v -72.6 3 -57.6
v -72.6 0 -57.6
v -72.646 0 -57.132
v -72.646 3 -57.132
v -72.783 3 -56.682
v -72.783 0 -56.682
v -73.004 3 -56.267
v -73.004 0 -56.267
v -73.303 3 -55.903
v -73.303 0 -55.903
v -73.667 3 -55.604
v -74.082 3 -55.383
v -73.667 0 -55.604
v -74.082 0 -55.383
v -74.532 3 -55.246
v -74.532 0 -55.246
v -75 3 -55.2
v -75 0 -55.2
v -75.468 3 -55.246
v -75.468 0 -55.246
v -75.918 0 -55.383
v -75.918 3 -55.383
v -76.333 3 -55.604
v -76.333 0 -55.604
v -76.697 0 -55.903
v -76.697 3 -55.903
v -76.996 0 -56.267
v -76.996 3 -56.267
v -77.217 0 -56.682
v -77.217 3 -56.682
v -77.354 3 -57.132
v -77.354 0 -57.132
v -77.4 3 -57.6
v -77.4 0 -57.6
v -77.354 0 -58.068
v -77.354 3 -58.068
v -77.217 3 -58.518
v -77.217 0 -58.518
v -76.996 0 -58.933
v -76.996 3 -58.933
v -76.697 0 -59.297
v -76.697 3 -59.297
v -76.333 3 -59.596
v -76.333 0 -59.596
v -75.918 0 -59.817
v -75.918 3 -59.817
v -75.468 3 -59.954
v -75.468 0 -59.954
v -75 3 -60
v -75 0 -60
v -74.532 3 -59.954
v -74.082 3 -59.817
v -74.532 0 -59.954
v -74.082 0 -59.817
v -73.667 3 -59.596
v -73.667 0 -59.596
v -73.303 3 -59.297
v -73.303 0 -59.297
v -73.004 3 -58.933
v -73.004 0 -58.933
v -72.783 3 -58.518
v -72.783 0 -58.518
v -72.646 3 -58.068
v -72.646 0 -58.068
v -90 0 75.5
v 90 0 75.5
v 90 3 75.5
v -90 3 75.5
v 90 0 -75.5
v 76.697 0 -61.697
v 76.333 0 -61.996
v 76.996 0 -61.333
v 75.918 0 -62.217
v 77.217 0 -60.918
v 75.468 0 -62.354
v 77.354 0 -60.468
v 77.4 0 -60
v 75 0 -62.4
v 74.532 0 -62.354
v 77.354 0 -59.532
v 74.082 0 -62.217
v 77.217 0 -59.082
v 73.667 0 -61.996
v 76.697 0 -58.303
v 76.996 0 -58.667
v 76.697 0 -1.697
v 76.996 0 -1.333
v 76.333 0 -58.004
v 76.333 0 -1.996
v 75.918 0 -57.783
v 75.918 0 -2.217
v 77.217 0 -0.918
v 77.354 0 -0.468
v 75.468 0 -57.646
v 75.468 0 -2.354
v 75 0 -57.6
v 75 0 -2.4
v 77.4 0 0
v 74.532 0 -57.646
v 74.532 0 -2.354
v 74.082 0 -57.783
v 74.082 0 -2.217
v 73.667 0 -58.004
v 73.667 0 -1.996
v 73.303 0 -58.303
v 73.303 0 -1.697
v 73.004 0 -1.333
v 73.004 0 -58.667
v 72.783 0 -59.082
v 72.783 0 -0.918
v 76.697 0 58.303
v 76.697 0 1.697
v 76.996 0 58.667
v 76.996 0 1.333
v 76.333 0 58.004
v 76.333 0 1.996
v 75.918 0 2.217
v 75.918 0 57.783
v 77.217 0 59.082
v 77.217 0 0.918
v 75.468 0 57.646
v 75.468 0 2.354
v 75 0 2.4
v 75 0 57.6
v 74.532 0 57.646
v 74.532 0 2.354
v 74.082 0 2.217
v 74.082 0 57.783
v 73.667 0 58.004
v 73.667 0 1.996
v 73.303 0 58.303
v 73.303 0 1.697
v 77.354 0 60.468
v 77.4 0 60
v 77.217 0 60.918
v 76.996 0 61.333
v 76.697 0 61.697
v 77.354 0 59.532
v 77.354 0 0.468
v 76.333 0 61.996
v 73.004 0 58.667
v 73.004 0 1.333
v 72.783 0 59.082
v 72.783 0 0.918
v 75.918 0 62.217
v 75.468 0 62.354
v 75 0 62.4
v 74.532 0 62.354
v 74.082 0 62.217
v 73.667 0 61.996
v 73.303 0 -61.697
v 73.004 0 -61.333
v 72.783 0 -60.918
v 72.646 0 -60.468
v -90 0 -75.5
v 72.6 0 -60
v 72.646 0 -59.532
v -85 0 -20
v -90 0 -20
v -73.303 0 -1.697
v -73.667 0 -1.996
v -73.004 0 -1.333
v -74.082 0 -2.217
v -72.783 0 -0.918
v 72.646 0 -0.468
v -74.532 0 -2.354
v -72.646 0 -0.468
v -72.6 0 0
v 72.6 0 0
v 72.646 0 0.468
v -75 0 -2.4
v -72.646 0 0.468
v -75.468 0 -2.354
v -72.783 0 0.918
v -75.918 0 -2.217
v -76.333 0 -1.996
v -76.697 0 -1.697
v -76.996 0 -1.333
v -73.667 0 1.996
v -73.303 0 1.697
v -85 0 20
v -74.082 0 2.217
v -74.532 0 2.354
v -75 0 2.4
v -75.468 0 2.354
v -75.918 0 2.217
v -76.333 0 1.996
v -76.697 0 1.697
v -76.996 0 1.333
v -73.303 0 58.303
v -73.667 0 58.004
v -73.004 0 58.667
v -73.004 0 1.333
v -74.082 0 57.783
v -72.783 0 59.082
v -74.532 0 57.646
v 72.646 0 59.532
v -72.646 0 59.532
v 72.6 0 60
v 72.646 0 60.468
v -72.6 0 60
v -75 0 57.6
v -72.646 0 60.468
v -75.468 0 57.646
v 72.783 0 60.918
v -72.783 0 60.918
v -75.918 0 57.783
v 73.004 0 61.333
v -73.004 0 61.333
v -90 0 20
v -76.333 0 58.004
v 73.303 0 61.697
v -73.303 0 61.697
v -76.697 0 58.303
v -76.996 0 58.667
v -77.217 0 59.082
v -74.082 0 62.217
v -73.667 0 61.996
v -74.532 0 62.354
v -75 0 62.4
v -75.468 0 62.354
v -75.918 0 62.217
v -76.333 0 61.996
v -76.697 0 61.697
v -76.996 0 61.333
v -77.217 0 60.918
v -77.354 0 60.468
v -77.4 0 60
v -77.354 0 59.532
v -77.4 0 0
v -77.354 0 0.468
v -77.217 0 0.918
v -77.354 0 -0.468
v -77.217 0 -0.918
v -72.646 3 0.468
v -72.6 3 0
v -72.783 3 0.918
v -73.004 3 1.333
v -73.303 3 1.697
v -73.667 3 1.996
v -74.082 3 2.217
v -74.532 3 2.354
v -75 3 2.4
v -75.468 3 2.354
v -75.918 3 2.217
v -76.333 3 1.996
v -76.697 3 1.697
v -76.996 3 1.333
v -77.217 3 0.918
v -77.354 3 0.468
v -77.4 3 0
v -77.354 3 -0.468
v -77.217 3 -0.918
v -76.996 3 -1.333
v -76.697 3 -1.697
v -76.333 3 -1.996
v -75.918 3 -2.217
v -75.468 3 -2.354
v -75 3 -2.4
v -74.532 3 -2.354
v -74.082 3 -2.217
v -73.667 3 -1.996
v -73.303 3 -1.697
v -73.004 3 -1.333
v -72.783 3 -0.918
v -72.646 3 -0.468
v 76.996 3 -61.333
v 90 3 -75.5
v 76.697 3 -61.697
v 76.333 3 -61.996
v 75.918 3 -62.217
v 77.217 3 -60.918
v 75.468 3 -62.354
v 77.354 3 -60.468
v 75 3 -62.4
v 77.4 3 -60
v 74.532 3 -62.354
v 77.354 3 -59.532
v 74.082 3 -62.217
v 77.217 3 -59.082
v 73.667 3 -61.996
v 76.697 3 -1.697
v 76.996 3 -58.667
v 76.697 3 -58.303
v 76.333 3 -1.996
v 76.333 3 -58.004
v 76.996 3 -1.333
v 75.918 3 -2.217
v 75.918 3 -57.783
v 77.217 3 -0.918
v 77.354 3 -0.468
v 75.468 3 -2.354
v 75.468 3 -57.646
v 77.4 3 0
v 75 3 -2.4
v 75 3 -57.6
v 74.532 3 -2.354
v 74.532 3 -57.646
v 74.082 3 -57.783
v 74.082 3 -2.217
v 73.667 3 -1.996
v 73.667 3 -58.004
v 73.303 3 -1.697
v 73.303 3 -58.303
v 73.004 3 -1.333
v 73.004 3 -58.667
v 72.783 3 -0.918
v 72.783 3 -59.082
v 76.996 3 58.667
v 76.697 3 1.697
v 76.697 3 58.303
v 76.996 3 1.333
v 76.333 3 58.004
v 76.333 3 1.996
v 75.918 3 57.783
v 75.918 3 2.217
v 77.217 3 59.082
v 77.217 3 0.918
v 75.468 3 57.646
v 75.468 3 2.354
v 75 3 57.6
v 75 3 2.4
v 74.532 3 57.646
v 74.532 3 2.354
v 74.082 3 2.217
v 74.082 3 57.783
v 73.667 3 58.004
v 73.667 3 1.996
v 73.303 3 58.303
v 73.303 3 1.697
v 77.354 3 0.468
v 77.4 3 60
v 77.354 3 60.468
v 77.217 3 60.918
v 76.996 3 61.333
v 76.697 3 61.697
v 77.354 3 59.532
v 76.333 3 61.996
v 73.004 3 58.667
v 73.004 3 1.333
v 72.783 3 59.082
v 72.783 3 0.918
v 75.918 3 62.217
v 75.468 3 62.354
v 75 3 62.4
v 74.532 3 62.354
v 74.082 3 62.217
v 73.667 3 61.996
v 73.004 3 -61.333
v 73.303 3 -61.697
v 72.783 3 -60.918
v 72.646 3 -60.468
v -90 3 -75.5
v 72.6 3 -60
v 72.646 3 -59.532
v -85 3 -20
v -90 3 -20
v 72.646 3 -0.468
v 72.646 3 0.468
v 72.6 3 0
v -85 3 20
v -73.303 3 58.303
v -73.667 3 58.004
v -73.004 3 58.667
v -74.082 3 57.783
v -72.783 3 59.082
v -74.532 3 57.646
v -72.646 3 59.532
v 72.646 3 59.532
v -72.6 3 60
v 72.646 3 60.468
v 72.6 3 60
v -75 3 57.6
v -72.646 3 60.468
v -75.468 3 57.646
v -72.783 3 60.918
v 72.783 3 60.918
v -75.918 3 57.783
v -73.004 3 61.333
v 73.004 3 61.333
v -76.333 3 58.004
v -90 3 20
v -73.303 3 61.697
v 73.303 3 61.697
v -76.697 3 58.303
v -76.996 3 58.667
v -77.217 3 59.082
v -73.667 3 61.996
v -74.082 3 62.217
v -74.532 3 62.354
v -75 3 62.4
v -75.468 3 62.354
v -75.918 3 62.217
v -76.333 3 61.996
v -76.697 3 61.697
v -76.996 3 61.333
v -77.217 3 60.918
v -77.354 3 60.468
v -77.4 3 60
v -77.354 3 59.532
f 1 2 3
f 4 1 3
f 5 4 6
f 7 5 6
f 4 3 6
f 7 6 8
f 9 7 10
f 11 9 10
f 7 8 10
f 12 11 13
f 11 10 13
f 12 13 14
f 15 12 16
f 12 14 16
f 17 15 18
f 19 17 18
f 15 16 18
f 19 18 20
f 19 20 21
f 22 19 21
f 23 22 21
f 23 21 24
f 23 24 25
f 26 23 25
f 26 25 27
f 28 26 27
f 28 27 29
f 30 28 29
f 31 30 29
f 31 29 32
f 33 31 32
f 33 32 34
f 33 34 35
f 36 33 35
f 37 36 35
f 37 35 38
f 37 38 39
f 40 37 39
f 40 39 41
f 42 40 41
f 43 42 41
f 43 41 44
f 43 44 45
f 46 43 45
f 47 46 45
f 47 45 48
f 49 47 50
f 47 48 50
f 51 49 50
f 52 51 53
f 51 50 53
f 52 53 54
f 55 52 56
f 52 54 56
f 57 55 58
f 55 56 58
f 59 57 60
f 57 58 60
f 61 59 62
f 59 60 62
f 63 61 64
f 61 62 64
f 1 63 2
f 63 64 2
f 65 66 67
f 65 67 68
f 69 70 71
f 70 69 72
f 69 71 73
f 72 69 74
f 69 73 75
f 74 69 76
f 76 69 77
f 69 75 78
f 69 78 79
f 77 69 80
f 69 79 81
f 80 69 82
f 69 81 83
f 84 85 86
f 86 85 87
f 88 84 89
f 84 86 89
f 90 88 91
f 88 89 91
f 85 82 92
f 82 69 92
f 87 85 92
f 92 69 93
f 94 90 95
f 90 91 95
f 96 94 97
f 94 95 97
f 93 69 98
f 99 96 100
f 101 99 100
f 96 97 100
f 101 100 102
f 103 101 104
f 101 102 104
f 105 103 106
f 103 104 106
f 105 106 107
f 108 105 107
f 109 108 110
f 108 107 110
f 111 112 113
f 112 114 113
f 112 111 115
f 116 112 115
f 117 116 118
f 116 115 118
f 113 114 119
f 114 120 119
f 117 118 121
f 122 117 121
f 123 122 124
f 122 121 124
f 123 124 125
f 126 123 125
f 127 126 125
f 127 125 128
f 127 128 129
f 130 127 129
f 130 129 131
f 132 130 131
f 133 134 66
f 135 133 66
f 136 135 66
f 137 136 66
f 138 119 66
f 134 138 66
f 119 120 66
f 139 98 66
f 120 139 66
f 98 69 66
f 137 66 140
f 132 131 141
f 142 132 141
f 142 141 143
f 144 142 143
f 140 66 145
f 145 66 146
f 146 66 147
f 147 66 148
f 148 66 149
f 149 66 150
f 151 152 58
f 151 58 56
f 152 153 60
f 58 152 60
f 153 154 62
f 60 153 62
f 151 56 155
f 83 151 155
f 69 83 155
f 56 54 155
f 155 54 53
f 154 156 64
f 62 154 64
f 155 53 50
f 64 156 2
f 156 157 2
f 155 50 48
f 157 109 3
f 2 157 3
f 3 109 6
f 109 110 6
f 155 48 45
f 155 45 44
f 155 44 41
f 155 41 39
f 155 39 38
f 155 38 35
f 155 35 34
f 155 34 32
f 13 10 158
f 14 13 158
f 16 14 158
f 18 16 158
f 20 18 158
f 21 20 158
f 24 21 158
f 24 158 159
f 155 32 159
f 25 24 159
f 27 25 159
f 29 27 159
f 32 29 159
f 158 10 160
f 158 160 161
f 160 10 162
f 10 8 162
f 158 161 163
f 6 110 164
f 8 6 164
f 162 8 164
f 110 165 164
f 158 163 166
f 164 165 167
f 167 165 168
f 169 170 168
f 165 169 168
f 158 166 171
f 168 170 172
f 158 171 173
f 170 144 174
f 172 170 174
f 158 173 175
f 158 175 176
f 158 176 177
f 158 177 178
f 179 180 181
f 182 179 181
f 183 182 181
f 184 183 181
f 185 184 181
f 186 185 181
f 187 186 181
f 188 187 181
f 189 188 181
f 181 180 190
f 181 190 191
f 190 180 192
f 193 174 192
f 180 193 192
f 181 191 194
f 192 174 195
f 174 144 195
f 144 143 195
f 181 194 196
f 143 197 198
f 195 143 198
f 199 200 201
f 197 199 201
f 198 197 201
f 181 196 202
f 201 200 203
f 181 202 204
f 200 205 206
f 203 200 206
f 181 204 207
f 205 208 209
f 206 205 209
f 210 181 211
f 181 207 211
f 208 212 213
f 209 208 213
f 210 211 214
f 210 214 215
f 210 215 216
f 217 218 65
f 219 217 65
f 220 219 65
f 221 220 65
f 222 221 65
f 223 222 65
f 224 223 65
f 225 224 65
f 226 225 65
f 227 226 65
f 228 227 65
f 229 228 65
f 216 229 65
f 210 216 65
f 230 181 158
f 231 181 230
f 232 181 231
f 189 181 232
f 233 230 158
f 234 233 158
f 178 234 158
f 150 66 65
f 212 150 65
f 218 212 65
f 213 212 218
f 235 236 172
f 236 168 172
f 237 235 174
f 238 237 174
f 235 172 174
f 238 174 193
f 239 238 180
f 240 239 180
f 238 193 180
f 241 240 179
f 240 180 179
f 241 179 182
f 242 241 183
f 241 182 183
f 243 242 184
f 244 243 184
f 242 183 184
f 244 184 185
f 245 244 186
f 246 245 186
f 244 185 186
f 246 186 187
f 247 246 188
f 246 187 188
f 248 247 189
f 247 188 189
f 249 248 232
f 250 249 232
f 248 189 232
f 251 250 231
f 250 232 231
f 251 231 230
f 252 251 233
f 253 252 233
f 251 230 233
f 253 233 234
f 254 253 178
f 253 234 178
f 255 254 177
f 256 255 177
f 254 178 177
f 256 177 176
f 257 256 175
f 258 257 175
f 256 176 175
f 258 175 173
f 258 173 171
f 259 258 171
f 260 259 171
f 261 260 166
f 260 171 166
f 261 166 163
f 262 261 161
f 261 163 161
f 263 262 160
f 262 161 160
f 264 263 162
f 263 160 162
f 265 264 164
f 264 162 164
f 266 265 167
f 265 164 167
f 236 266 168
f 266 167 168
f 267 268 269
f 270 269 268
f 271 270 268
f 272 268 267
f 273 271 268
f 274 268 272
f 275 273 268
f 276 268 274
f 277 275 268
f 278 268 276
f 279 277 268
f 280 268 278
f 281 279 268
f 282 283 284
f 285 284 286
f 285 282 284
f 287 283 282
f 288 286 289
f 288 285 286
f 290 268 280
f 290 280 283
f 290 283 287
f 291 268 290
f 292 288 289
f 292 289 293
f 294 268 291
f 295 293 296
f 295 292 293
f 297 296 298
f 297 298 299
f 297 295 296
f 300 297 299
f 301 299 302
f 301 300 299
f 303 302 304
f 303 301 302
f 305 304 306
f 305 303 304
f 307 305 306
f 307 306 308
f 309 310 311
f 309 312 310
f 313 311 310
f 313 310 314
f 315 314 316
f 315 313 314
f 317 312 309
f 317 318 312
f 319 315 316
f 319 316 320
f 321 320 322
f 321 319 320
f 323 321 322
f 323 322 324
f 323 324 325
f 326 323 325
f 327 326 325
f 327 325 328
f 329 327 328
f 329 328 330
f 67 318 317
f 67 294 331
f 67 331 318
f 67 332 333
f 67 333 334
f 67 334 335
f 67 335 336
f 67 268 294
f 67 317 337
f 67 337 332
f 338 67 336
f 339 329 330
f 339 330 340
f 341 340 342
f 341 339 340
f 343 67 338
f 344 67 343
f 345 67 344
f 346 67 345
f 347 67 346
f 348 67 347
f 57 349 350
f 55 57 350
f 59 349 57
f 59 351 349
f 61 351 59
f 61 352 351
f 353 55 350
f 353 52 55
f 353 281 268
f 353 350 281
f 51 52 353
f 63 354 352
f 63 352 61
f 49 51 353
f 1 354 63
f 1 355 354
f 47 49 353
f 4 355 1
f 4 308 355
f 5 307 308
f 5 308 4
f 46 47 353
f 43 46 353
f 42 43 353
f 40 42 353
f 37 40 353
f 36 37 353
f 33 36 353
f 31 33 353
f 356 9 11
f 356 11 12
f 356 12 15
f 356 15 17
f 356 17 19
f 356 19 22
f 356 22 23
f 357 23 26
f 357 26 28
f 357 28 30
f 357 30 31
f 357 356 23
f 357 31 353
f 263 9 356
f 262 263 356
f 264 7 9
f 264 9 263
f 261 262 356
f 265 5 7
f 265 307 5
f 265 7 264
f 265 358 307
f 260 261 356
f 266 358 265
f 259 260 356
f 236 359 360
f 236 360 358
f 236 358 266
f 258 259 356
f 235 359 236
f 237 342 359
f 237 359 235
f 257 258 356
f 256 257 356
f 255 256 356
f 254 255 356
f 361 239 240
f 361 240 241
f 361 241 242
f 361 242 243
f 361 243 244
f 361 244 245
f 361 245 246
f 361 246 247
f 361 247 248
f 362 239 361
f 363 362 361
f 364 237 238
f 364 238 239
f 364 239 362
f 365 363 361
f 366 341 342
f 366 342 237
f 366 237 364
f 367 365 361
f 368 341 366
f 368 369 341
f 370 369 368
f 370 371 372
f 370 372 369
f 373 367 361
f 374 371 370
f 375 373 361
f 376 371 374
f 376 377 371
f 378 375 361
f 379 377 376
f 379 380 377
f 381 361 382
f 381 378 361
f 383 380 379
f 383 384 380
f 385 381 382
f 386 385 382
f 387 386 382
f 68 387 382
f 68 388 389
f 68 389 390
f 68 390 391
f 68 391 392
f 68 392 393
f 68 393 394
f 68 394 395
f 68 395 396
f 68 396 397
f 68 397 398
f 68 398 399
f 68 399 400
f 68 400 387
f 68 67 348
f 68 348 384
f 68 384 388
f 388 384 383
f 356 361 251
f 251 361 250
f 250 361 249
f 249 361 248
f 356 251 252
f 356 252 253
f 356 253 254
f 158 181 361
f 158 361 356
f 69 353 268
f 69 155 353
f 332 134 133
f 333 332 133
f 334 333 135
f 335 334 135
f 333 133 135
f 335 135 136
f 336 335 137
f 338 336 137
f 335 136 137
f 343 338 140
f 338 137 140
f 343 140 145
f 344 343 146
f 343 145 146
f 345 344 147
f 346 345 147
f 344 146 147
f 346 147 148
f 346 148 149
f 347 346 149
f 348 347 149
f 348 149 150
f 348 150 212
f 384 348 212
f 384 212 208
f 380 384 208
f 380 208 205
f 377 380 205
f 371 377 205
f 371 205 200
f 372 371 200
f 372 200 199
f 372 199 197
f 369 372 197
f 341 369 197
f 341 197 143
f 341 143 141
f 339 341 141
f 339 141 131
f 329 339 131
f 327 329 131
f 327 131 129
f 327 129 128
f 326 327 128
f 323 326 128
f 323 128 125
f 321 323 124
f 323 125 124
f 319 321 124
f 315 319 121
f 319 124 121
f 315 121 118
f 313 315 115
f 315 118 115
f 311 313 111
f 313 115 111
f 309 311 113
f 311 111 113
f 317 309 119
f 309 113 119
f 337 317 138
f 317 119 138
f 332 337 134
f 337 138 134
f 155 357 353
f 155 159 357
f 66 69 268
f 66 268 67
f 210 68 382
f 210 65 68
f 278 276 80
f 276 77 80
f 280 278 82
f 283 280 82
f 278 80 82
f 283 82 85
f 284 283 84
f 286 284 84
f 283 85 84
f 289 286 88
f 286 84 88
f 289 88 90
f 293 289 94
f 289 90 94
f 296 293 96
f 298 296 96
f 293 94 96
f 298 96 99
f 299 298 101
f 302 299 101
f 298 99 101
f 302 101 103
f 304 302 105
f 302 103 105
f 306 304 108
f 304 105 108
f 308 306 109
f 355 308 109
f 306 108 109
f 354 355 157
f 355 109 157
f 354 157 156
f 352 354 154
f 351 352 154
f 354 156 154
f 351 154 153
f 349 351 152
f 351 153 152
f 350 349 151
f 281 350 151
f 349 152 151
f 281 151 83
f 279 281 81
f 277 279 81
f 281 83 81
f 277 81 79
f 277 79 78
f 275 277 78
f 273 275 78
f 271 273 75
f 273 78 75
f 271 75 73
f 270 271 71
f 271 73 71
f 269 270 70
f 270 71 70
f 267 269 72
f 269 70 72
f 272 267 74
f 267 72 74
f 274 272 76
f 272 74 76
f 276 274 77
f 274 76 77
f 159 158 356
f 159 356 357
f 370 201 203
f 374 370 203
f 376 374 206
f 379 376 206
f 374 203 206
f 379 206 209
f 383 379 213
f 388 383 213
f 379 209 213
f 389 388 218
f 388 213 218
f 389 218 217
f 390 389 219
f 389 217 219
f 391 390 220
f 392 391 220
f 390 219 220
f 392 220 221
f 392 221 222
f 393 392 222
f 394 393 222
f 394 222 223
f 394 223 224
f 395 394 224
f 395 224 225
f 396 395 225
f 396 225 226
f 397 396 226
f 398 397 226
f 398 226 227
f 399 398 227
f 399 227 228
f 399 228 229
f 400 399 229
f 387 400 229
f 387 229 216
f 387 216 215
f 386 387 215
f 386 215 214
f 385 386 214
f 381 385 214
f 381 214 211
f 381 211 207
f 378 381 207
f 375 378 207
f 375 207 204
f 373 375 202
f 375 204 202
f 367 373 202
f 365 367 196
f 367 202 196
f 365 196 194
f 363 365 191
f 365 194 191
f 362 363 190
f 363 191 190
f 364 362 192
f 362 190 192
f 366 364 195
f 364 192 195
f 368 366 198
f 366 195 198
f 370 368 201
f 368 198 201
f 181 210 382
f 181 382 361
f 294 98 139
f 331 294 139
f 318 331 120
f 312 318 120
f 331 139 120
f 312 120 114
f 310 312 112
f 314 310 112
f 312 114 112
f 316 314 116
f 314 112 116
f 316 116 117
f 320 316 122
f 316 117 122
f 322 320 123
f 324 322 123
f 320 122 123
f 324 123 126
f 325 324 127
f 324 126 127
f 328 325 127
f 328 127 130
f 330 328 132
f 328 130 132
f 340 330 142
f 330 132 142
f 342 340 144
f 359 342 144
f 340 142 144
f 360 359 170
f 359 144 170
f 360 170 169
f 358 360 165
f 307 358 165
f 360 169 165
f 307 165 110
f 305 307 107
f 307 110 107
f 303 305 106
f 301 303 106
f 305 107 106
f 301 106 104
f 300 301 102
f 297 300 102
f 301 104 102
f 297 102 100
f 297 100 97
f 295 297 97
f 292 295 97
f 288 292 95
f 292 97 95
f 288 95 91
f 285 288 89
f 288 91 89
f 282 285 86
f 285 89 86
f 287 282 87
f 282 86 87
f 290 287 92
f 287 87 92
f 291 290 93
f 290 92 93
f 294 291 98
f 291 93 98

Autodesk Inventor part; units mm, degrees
ref_plane "YZ Plane" through (0, 0, 0) normal (1, 0, 0) x (0, 1, 0)
ref_plane "XZ Plane" through (0, 0, 0) normal (0, 1, 0) x (-1, 0, 0)
ref_plane "XY Plane" through (0, 0, 0) normal (0, 0, 1) x (1, 0, 0)
sketch "Sketch1" plane through (0, 0, 0) normal (0, 1, 0) x (-1, 0, 0)
  line L0 (-90, 75) -> (90, 75)
  line L1 (90, 75) -> (90, -75)
  line L2 (90, -75) -> (-90, -75)
  line L3 (-90, -75) -> (-90, 75)
  line L4 (-90, 75) -> (90, -75) construction
  line L5 (90, 75) -> (-90, -75) construction
  point P0 (0, 0)
  dimension "d0" = 180
  dimension "d1" = 150
extrude "Extrusion1" add sketch "Sketch1" along normal blind 3
offset faces "Size1" outward 0.5 faces at (-30, 1, 75) (30, 1, -75)
sketch "Sketch2" plane through (0, 0, 0) normal (0, -1, 0) x (1, 0, 0)
  line L0 (-90, -75.5) -> (-90, 75.5) projected
  line L1 (-90, 20) -> (-85, 20)
  line L2 (-85, 20) -> (-85, -20)
  line L3 (-85, -20) -> (-90, -20)
  line L4 (-90, -20) -> (-90, 20)
  point P0 (0, 0)
  point P1 (-90, -77.5)
  point P2 (-90, 77.5)
  point P3 (-85, 0)
  point P4 (-90, 0)
  dimension "d6" = 40
  dimension "d7" = 5
extrude "Extrusion2" cut sketch "Sketch2" against normal blind 10
sketch "Sketch3" plane through (0, 0, 0) normal (0, -1, 0) x (1, 0, 0)
  circle A0 centre (75, 60) radius 2.4 projected
  circle A1 centre (75, 0) radius 2.4 projected
  circle A2 centre (75, -60) radius 2.4 projected
  circle A3 centre (-75, 60) radius 2.4 projected
  circle A4 centre (-75, 0) radius 2.4 projected
  circle A5 centre (-75, -57.6) radius 2.4
  point P0 (0, 0)
  dimension "d10" = 4.8
extrude "Extrusion3" cut sketch "Sketch3" against normal blind 10
properties part number "Front plane" material "Wood (Birch)"
